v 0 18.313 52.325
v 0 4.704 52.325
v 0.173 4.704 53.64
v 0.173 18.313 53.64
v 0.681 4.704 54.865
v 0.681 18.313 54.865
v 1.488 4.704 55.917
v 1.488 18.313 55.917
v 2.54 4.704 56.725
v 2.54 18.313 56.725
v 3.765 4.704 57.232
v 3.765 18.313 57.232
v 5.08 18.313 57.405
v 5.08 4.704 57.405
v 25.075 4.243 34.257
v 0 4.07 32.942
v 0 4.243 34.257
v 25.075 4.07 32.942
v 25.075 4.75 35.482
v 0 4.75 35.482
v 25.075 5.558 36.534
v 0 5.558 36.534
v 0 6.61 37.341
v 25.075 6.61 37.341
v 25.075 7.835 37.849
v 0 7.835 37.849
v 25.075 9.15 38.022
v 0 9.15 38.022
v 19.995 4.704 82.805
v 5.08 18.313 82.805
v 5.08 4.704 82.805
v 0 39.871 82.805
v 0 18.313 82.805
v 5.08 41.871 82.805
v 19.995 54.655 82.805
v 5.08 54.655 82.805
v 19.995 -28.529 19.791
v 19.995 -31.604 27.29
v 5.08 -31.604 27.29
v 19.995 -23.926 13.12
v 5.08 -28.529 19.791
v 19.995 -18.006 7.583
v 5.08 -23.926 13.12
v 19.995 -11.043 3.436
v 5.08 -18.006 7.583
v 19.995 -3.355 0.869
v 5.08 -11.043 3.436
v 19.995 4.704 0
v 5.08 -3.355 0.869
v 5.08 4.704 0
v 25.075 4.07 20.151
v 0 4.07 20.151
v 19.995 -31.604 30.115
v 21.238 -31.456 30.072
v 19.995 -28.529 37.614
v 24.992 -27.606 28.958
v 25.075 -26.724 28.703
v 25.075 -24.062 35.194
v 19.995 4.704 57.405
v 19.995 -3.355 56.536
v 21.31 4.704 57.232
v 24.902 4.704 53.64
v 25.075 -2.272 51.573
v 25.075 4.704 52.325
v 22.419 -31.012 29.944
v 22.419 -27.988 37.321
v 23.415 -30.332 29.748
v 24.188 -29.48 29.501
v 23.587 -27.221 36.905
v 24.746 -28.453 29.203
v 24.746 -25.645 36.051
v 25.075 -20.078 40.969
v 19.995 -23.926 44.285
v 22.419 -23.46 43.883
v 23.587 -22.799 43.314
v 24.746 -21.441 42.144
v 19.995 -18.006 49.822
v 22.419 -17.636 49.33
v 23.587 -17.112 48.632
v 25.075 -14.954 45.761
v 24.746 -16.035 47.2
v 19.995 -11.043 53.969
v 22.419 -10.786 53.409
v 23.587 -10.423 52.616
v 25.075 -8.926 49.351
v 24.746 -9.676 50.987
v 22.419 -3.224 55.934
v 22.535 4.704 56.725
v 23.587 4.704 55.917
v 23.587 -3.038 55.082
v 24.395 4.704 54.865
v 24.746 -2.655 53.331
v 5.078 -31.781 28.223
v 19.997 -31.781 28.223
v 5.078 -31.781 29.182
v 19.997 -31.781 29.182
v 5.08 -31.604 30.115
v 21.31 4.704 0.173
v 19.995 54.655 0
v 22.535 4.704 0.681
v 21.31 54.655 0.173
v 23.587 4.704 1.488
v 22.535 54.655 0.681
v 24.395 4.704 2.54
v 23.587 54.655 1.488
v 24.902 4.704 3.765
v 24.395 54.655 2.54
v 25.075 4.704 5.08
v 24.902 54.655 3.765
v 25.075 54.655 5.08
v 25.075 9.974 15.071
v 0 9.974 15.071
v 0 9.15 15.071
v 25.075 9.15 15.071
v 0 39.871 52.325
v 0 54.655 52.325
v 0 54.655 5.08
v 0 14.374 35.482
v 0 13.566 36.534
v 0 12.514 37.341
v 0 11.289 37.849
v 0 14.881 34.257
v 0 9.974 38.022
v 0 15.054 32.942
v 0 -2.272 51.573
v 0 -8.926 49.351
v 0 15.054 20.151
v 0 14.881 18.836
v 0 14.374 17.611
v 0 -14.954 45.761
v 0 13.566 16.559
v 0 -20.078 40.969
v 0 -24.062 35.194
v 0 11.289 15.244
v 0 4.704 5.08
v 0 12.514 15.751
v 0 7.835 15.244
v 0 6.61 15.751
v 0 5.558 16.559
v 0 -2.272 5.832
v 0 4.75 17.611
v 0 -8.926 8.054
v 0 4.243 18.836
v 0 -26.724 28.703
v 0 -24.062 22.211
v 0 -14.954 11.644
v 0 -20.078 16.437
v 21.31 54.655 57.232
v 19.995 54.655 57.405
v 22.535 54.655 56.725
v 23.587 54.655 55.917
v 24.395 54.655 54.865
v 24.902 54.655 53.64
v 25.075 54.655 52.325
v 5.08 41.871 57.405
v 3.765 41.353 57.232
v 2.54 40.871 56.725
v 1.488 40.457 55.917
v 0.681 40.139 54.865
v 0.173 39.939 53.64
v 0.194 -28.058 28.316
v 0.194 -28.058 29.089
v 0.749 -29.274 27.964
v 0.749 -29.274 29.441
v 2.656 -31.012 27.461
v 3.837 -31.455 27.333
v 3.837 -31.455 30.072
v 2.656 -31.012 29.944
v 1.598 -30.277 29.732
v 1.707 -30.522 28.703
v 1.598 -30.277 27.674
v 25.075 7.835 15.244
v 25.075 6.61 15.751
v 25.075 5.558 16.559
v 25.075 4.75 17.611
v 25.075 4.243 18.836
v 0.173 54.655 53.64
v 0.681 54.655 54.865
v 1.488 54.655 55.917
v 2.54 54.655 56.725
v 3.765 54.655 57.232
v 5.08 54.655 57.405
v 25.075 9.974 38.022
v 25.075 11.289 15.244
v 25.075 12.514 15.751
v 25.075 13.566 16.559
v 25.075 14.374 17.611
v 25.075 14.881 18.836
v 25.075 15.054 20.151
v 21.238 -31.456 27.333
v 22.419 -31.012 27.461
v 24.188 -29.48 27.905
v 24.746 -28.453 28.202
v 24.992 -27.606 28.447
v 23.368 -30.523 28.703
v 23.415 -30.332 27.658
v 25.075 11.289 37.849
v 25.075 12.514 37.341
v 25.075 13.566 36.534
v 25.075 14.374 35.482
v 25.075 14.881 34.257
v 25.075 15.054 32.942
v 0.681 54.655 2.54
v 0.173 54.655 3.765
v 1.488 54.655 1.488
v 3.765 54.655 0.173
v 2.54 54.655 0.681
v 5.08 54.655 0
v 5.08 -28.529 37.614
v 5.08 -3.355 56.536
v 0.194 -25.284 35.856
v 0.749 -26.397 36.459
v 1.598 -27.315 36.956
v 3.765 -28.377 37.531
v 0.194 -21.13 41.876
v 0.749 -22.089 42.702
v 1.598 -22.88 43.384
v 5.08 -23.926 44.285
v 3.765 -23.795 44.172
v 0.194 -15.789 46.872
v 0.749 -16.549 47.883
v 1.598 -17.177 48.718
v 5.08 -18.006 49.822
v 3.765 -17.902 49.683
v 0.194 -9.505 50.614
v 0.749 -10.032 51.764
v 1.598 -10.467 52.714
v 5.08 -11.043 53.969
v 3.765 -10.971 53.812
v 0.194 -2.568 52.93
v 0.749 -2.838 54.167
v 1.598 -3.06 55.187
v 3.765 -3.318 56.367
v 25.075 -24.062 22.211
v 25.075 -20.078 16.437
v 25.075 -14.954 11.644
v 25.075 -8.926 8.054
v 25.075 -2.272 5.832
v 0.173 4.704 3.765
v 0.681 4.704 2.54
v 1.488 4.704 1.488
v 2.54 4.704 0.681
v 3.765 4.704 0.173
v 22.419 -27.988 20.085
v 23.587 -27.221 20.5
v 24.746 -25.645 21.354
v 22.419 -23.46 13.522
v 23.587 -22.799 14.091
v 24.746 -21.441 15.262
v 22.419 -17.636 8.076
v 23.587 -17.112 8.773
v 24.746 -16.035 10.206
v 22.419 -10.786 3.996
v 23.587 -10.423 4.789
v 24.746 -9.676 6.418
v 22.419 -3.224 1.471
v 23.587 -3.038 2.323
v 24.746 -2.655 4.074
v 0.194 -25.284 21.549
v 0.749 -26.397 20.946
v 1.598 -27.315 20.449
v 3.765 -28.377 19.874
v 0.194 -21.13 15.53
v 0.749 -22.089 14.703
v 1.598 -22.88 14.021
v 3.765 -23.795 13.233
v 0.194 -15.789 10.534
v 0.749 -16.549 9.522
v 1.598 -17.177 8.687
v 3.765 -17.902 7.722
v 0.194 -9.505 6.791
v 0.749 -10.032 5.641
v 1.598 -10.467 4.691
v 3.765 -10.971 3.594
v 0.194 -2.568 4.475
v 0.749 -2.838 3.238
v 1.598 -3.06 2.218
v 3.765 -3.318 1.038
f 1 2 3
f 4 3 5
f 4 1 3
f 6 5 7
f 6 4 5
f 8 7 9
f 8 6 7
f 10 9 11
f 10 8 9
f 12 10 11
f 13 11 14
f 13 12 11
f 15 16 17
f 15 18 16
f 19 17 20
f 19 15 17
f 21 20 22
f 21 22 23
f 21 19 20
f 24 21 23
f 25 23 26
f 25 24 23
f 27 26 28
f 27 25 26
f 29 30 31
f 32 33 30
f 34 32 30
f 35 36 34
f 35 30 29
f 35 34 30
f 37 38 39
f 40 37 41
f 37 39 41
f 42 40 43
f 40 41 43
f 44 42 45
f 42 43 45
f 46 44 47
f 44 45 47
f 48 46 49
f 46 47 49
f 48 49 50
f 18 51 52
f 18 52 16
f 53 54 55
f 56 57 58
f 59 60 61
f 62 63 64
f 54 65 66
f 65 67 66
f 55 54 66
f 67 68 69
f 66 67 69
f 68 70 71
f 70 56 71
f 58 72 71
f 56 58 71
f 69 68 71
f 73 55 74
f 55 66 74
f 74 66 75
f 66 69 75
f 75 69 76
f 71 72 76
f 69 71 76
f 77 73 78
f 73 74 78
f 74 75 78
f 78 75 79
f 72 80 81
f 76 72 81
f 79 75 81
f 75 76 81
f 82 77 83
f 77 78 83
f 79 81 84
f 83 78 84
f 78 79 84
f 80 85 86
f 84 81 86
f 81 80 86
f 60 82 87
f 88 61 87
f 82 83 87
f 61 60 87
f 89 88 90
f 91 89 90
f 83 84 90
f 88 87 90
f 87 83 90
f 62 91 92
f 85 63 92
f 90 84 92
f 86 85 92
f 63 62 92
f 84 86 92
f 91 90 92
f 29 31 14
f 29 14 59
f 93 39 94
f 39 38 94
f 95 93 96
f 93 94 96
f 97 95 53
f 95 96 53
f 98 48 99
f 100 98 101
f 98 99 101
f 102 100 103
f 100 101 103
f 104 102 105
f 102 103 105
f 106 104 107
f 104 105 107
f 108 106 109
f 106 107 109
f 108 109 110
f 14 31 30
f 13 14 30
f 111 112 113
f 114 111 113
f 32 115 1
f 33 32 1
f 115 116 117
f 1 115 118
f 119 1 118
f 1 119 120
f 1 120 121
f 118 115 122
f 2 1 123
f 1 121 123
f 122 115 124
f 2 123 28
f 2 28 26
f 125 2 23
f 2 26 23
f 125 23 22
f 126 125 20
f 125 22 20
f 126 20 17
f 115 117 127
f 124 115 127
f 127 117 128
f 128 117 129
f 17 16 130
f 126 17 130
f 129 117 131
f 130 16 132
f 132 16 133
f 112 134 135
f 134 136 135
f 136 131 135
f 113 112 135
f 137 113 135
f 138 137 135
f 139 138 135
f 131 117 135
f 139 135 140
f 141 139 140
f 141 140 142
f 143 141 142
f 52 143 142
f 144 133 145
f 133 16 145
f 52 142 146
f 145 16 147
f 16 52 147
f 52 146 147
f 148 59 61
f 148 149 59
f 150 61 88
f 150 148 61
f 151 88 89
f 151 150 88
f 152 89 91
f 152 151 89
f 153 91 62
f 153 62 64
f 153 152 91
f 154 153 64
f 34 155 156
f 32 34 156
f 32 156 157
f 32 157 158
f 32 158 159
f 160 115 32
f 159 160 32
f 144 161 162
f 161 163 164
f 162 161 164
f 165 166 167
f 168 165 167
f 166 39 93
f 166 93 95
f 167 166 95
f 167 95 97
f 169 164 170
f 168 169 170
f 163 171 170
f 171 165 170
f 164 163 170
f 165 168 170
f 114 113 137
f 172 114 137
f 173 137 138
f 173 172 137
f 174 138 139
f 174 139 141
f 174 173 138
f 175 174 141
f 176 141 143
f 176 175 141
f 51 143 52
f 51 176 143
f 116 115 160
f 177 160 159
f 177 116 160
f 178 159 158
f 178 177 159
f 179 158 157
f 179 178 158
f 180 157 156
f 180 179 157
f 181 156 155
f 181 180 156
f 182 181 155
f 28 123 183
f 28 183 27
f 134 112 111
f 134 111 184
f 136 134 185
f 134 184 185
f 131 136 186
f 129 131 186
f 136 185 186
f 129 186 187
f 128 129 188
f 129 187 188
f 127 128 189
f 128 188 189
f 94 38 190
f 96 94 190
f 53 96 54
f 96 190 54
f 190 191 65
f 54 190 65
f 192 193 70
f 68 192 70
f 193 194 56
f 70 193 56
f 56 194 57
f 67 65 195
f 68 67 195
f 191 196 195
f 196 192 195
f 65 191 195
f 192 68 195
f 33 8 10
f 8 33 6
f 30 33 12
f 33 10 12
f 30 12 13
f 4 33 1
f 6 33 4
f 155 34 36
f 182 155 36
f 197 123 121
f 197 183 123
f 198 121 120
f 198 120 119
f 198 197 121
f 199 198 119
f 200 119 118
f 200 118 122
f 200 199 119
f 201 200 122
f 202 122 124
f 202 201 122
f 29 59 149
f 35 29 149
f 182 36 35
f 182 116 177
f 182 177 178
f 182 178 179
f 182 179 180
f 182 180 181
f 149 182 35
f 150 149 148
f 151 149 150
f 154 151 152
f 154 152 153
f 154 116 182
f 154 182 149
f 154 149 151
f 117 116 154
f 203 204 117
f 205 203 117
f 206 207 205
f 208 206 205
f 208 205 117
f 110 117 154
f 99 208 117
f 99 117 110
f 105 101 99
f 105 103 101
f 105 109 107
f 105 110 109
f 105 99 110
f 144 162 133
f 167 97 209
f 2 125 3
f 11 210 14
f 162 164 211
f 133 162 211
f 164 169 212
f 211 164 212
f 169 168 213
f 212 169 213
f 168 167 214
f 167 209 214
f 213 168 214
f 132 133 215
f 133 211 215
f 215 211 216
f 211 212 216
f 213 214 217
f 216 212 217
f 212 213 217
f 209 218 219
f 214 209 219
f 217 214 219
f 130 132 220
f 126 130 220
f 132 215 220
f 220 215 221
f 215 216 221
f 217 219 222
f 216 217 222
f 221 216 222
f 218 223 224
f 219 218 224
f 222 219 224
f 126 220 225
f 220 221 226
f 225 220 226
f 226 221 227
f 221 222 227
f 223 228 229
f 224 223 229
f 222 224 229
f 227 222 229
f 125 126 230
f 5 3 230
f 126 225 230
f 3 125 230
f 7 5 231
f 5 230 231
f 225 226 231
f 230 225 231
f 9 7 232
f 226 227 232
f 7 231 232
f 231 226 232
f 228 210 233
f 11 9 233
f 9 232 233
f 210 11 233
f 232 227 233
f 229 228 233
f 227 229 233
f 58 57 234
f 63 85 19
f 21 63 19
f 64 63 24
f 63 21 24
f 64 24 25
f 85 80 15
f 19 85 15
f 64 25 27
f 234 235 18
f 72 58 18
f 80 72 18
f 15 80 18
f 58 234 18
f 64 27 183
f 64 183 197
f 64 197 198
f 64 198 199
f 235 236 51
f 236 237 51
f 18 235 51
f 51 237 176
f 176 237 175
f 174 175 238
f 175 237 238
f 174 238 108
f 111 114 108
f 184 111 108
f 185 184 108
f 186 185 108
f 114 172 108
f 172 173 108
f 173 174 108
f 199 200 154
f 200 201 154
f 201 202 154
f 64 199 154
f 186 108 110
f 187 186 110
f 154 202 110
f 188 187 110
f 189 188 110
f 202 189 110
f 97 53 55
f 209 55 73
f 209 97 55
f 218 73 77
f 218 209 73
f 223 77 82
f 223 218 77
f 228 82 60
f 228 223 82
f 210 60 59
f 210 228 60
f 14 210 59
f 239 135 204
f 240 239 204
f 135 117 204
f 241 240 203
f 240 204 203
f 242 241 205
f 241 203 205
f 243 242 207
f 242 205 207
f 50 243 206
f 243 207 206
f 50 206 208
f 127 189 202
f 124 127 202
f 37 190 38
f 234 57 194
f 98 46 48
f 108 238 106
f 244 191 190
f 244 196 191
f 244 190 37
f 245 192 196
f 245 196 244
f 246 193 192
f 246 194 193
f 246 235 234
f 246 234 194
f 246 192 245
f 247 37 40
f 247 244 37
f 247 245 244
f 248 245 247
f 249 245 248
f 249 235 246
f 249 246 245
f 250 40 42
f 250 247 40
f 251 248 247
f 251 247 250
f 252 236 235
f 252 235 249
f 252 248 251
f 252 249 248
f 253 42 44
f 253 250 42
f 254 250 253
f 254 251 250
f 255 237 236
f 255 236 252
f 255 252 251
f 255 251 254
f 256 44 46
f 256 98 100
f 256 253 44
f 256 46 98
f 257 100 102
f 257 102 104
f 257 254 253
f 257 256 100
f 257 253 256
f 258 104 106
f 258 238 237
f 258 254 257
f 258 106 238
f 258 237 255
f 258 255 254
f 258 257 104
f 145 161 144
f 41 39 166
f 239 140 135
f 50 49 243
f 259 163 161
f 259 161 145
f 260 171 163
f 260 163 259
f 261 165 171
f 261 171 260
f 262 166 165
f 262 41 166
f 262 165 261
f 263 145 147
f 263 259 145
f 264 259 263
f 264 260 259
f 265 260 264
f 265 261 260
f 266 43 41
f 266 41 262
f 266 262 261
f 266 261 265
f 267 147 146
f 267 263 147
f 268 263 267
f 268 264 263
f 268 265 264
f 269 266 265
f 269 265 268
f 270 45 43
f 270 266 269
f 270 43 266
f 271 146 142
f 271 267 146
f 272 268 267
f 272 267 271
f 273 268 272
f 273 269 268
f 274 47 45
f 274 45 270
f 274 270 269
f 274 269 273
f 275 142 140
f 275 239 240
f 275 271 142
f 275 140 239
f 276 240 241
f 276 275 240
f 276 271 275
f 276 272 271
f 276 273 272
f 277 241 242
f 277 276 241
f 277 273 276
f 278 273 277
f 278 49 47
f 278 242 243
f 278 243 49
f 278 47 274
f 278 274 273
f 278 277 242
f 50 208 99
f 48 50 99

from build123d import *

# Parameters (mm, degrees)
F0_W        = 25.0751823187
F0_H        = 87.748773396
F1_DEPTH    = 57.4051365256
F2_T1_DEPTH = 214.0604270912
F3_R        = 5.08
F4_R        = 5.08
F5_W        = 10.9846293926
F5_H        = 22.9512043297
F6_DEPTH    = 76.7630785704
F7_R        = 5.08
F9_DEPTH    = 36.4525131881
F10_DEPTH   = 25.4


# Not quite as in the source:
# - a fillet or chamfer that OpenCascade refuses, or shapes differently, is made with other operations: its cross-section is extruded or revolved along the edge and cut away or added


with BuildPart() as f1:
    # F0 (on Top) → F1 (new body)
    with BuildSketch(Plane.XY):
        with Locations((12.5375911593, 10.7809714973)):
            Rectangle(F0_W, F0_H)
    extrude(amount=F1_DEPTH)

    # F2: fillet of radius 37.7970489545 on 2 edges, made by hand

    # F2_s2 → F2_t1 (cut)
    with BuildSketch(Plane.YZ.offset(-94.4926223863)):
        with BuildLine():
            ThreePointArc((-33.0934152007, 19.6080875711), (-22.0229158708, 46.3346371957), (4.7036337538, 57.4051365256))
            Line((4.7036337538, 57.4051365256), (-33.0934152007, 57.4051365256))
            Line((-33.0934152007, 57.4051365256), (-33.0934152007, 19.6080875711))
        make_face()
        with BuildLine():
            ThreePointArc((-33.0934152007, 37.7970489545), (-22.0229158708, 11.0704993299), (4.7036337538, 0))
            Line((4.7036337538, 0), (-33.0934152007, 0))
            Line((-33.0934152007, 0), (-33.0934152007, 37.7970489545))
        make_face()
    extrude(amount=F2_T1_DEPTH, mode=Mode.SUBTRACT)

    # F3
    f3_edges = [f1.edges().sort_by_distance(p)[0] for p in [
        (0, 29.679496, 0),
        (0, -18.586626, 8.028261),
        (25.075182, 29.679496, 57.405137),
        (25.075182, -18.586626, 49.376875),
        (25.075182, 29.679496, 0),
        (25.075182, -18.586626, 8.028261),
        (0, -18.586626, 49.376875),
        (0, 29.679496, 57.405137),
    ]]
    fillet(f3_edges, radius=F3_R)

    # F4
    f4_edges = [f1.edges().sort_by_distance(p)[0] for p in [
        (12.537591, -31.982976, 28.702568),
    ]]
    fillet(f4_edges, radius=F4_R)

    # F5 (on face) → F6 (cut)
    with BuildSketch(Plane(origin=(0, 0, 0), x_dir=(0, -1, 0), z_dir=(-1, 0, 0))):
        with Locations((-9.5620453358, 26.5463981777)):
            Rectangle(F5_W, F5_H)
    extrude(amount=-F6_DEPTH, mode=Mode.SUBTRACT)

    # F7
    f7_edges = [f1.edges().sort_by_distance(p)[0] for p in [
        (12.537591, 4.069731, 38.022),
        (12.537591, 4.069731, 15.070796),
        (12.537591, 15.05436, 15.070796),
        (12.537591, 15.05436, 38.022),
    ]]
    fillet(f7_edges, radius=F7_R)

    # F8 (on face) → F9 (join)
    with BuildSketch(Plane.XY.offset(57.4051365256)):
        Polygon((0, 18.3127000928), (5.08, 18.3127000928), (5.08, 41.8710074145), (0, 39.8706048727), align=None)
    extrude(amount=-F9_DEPTH)

    # F10 (add): a face of the model
    f10_faces = [f1.faces().sort_by_distance(p)[0] for p in [
        (11.2098476386, 29.6687845578, 57.4051365256),
    ]]
    extrude(f10_faces, amount=F10_DEPTH)


solid = f1.part
